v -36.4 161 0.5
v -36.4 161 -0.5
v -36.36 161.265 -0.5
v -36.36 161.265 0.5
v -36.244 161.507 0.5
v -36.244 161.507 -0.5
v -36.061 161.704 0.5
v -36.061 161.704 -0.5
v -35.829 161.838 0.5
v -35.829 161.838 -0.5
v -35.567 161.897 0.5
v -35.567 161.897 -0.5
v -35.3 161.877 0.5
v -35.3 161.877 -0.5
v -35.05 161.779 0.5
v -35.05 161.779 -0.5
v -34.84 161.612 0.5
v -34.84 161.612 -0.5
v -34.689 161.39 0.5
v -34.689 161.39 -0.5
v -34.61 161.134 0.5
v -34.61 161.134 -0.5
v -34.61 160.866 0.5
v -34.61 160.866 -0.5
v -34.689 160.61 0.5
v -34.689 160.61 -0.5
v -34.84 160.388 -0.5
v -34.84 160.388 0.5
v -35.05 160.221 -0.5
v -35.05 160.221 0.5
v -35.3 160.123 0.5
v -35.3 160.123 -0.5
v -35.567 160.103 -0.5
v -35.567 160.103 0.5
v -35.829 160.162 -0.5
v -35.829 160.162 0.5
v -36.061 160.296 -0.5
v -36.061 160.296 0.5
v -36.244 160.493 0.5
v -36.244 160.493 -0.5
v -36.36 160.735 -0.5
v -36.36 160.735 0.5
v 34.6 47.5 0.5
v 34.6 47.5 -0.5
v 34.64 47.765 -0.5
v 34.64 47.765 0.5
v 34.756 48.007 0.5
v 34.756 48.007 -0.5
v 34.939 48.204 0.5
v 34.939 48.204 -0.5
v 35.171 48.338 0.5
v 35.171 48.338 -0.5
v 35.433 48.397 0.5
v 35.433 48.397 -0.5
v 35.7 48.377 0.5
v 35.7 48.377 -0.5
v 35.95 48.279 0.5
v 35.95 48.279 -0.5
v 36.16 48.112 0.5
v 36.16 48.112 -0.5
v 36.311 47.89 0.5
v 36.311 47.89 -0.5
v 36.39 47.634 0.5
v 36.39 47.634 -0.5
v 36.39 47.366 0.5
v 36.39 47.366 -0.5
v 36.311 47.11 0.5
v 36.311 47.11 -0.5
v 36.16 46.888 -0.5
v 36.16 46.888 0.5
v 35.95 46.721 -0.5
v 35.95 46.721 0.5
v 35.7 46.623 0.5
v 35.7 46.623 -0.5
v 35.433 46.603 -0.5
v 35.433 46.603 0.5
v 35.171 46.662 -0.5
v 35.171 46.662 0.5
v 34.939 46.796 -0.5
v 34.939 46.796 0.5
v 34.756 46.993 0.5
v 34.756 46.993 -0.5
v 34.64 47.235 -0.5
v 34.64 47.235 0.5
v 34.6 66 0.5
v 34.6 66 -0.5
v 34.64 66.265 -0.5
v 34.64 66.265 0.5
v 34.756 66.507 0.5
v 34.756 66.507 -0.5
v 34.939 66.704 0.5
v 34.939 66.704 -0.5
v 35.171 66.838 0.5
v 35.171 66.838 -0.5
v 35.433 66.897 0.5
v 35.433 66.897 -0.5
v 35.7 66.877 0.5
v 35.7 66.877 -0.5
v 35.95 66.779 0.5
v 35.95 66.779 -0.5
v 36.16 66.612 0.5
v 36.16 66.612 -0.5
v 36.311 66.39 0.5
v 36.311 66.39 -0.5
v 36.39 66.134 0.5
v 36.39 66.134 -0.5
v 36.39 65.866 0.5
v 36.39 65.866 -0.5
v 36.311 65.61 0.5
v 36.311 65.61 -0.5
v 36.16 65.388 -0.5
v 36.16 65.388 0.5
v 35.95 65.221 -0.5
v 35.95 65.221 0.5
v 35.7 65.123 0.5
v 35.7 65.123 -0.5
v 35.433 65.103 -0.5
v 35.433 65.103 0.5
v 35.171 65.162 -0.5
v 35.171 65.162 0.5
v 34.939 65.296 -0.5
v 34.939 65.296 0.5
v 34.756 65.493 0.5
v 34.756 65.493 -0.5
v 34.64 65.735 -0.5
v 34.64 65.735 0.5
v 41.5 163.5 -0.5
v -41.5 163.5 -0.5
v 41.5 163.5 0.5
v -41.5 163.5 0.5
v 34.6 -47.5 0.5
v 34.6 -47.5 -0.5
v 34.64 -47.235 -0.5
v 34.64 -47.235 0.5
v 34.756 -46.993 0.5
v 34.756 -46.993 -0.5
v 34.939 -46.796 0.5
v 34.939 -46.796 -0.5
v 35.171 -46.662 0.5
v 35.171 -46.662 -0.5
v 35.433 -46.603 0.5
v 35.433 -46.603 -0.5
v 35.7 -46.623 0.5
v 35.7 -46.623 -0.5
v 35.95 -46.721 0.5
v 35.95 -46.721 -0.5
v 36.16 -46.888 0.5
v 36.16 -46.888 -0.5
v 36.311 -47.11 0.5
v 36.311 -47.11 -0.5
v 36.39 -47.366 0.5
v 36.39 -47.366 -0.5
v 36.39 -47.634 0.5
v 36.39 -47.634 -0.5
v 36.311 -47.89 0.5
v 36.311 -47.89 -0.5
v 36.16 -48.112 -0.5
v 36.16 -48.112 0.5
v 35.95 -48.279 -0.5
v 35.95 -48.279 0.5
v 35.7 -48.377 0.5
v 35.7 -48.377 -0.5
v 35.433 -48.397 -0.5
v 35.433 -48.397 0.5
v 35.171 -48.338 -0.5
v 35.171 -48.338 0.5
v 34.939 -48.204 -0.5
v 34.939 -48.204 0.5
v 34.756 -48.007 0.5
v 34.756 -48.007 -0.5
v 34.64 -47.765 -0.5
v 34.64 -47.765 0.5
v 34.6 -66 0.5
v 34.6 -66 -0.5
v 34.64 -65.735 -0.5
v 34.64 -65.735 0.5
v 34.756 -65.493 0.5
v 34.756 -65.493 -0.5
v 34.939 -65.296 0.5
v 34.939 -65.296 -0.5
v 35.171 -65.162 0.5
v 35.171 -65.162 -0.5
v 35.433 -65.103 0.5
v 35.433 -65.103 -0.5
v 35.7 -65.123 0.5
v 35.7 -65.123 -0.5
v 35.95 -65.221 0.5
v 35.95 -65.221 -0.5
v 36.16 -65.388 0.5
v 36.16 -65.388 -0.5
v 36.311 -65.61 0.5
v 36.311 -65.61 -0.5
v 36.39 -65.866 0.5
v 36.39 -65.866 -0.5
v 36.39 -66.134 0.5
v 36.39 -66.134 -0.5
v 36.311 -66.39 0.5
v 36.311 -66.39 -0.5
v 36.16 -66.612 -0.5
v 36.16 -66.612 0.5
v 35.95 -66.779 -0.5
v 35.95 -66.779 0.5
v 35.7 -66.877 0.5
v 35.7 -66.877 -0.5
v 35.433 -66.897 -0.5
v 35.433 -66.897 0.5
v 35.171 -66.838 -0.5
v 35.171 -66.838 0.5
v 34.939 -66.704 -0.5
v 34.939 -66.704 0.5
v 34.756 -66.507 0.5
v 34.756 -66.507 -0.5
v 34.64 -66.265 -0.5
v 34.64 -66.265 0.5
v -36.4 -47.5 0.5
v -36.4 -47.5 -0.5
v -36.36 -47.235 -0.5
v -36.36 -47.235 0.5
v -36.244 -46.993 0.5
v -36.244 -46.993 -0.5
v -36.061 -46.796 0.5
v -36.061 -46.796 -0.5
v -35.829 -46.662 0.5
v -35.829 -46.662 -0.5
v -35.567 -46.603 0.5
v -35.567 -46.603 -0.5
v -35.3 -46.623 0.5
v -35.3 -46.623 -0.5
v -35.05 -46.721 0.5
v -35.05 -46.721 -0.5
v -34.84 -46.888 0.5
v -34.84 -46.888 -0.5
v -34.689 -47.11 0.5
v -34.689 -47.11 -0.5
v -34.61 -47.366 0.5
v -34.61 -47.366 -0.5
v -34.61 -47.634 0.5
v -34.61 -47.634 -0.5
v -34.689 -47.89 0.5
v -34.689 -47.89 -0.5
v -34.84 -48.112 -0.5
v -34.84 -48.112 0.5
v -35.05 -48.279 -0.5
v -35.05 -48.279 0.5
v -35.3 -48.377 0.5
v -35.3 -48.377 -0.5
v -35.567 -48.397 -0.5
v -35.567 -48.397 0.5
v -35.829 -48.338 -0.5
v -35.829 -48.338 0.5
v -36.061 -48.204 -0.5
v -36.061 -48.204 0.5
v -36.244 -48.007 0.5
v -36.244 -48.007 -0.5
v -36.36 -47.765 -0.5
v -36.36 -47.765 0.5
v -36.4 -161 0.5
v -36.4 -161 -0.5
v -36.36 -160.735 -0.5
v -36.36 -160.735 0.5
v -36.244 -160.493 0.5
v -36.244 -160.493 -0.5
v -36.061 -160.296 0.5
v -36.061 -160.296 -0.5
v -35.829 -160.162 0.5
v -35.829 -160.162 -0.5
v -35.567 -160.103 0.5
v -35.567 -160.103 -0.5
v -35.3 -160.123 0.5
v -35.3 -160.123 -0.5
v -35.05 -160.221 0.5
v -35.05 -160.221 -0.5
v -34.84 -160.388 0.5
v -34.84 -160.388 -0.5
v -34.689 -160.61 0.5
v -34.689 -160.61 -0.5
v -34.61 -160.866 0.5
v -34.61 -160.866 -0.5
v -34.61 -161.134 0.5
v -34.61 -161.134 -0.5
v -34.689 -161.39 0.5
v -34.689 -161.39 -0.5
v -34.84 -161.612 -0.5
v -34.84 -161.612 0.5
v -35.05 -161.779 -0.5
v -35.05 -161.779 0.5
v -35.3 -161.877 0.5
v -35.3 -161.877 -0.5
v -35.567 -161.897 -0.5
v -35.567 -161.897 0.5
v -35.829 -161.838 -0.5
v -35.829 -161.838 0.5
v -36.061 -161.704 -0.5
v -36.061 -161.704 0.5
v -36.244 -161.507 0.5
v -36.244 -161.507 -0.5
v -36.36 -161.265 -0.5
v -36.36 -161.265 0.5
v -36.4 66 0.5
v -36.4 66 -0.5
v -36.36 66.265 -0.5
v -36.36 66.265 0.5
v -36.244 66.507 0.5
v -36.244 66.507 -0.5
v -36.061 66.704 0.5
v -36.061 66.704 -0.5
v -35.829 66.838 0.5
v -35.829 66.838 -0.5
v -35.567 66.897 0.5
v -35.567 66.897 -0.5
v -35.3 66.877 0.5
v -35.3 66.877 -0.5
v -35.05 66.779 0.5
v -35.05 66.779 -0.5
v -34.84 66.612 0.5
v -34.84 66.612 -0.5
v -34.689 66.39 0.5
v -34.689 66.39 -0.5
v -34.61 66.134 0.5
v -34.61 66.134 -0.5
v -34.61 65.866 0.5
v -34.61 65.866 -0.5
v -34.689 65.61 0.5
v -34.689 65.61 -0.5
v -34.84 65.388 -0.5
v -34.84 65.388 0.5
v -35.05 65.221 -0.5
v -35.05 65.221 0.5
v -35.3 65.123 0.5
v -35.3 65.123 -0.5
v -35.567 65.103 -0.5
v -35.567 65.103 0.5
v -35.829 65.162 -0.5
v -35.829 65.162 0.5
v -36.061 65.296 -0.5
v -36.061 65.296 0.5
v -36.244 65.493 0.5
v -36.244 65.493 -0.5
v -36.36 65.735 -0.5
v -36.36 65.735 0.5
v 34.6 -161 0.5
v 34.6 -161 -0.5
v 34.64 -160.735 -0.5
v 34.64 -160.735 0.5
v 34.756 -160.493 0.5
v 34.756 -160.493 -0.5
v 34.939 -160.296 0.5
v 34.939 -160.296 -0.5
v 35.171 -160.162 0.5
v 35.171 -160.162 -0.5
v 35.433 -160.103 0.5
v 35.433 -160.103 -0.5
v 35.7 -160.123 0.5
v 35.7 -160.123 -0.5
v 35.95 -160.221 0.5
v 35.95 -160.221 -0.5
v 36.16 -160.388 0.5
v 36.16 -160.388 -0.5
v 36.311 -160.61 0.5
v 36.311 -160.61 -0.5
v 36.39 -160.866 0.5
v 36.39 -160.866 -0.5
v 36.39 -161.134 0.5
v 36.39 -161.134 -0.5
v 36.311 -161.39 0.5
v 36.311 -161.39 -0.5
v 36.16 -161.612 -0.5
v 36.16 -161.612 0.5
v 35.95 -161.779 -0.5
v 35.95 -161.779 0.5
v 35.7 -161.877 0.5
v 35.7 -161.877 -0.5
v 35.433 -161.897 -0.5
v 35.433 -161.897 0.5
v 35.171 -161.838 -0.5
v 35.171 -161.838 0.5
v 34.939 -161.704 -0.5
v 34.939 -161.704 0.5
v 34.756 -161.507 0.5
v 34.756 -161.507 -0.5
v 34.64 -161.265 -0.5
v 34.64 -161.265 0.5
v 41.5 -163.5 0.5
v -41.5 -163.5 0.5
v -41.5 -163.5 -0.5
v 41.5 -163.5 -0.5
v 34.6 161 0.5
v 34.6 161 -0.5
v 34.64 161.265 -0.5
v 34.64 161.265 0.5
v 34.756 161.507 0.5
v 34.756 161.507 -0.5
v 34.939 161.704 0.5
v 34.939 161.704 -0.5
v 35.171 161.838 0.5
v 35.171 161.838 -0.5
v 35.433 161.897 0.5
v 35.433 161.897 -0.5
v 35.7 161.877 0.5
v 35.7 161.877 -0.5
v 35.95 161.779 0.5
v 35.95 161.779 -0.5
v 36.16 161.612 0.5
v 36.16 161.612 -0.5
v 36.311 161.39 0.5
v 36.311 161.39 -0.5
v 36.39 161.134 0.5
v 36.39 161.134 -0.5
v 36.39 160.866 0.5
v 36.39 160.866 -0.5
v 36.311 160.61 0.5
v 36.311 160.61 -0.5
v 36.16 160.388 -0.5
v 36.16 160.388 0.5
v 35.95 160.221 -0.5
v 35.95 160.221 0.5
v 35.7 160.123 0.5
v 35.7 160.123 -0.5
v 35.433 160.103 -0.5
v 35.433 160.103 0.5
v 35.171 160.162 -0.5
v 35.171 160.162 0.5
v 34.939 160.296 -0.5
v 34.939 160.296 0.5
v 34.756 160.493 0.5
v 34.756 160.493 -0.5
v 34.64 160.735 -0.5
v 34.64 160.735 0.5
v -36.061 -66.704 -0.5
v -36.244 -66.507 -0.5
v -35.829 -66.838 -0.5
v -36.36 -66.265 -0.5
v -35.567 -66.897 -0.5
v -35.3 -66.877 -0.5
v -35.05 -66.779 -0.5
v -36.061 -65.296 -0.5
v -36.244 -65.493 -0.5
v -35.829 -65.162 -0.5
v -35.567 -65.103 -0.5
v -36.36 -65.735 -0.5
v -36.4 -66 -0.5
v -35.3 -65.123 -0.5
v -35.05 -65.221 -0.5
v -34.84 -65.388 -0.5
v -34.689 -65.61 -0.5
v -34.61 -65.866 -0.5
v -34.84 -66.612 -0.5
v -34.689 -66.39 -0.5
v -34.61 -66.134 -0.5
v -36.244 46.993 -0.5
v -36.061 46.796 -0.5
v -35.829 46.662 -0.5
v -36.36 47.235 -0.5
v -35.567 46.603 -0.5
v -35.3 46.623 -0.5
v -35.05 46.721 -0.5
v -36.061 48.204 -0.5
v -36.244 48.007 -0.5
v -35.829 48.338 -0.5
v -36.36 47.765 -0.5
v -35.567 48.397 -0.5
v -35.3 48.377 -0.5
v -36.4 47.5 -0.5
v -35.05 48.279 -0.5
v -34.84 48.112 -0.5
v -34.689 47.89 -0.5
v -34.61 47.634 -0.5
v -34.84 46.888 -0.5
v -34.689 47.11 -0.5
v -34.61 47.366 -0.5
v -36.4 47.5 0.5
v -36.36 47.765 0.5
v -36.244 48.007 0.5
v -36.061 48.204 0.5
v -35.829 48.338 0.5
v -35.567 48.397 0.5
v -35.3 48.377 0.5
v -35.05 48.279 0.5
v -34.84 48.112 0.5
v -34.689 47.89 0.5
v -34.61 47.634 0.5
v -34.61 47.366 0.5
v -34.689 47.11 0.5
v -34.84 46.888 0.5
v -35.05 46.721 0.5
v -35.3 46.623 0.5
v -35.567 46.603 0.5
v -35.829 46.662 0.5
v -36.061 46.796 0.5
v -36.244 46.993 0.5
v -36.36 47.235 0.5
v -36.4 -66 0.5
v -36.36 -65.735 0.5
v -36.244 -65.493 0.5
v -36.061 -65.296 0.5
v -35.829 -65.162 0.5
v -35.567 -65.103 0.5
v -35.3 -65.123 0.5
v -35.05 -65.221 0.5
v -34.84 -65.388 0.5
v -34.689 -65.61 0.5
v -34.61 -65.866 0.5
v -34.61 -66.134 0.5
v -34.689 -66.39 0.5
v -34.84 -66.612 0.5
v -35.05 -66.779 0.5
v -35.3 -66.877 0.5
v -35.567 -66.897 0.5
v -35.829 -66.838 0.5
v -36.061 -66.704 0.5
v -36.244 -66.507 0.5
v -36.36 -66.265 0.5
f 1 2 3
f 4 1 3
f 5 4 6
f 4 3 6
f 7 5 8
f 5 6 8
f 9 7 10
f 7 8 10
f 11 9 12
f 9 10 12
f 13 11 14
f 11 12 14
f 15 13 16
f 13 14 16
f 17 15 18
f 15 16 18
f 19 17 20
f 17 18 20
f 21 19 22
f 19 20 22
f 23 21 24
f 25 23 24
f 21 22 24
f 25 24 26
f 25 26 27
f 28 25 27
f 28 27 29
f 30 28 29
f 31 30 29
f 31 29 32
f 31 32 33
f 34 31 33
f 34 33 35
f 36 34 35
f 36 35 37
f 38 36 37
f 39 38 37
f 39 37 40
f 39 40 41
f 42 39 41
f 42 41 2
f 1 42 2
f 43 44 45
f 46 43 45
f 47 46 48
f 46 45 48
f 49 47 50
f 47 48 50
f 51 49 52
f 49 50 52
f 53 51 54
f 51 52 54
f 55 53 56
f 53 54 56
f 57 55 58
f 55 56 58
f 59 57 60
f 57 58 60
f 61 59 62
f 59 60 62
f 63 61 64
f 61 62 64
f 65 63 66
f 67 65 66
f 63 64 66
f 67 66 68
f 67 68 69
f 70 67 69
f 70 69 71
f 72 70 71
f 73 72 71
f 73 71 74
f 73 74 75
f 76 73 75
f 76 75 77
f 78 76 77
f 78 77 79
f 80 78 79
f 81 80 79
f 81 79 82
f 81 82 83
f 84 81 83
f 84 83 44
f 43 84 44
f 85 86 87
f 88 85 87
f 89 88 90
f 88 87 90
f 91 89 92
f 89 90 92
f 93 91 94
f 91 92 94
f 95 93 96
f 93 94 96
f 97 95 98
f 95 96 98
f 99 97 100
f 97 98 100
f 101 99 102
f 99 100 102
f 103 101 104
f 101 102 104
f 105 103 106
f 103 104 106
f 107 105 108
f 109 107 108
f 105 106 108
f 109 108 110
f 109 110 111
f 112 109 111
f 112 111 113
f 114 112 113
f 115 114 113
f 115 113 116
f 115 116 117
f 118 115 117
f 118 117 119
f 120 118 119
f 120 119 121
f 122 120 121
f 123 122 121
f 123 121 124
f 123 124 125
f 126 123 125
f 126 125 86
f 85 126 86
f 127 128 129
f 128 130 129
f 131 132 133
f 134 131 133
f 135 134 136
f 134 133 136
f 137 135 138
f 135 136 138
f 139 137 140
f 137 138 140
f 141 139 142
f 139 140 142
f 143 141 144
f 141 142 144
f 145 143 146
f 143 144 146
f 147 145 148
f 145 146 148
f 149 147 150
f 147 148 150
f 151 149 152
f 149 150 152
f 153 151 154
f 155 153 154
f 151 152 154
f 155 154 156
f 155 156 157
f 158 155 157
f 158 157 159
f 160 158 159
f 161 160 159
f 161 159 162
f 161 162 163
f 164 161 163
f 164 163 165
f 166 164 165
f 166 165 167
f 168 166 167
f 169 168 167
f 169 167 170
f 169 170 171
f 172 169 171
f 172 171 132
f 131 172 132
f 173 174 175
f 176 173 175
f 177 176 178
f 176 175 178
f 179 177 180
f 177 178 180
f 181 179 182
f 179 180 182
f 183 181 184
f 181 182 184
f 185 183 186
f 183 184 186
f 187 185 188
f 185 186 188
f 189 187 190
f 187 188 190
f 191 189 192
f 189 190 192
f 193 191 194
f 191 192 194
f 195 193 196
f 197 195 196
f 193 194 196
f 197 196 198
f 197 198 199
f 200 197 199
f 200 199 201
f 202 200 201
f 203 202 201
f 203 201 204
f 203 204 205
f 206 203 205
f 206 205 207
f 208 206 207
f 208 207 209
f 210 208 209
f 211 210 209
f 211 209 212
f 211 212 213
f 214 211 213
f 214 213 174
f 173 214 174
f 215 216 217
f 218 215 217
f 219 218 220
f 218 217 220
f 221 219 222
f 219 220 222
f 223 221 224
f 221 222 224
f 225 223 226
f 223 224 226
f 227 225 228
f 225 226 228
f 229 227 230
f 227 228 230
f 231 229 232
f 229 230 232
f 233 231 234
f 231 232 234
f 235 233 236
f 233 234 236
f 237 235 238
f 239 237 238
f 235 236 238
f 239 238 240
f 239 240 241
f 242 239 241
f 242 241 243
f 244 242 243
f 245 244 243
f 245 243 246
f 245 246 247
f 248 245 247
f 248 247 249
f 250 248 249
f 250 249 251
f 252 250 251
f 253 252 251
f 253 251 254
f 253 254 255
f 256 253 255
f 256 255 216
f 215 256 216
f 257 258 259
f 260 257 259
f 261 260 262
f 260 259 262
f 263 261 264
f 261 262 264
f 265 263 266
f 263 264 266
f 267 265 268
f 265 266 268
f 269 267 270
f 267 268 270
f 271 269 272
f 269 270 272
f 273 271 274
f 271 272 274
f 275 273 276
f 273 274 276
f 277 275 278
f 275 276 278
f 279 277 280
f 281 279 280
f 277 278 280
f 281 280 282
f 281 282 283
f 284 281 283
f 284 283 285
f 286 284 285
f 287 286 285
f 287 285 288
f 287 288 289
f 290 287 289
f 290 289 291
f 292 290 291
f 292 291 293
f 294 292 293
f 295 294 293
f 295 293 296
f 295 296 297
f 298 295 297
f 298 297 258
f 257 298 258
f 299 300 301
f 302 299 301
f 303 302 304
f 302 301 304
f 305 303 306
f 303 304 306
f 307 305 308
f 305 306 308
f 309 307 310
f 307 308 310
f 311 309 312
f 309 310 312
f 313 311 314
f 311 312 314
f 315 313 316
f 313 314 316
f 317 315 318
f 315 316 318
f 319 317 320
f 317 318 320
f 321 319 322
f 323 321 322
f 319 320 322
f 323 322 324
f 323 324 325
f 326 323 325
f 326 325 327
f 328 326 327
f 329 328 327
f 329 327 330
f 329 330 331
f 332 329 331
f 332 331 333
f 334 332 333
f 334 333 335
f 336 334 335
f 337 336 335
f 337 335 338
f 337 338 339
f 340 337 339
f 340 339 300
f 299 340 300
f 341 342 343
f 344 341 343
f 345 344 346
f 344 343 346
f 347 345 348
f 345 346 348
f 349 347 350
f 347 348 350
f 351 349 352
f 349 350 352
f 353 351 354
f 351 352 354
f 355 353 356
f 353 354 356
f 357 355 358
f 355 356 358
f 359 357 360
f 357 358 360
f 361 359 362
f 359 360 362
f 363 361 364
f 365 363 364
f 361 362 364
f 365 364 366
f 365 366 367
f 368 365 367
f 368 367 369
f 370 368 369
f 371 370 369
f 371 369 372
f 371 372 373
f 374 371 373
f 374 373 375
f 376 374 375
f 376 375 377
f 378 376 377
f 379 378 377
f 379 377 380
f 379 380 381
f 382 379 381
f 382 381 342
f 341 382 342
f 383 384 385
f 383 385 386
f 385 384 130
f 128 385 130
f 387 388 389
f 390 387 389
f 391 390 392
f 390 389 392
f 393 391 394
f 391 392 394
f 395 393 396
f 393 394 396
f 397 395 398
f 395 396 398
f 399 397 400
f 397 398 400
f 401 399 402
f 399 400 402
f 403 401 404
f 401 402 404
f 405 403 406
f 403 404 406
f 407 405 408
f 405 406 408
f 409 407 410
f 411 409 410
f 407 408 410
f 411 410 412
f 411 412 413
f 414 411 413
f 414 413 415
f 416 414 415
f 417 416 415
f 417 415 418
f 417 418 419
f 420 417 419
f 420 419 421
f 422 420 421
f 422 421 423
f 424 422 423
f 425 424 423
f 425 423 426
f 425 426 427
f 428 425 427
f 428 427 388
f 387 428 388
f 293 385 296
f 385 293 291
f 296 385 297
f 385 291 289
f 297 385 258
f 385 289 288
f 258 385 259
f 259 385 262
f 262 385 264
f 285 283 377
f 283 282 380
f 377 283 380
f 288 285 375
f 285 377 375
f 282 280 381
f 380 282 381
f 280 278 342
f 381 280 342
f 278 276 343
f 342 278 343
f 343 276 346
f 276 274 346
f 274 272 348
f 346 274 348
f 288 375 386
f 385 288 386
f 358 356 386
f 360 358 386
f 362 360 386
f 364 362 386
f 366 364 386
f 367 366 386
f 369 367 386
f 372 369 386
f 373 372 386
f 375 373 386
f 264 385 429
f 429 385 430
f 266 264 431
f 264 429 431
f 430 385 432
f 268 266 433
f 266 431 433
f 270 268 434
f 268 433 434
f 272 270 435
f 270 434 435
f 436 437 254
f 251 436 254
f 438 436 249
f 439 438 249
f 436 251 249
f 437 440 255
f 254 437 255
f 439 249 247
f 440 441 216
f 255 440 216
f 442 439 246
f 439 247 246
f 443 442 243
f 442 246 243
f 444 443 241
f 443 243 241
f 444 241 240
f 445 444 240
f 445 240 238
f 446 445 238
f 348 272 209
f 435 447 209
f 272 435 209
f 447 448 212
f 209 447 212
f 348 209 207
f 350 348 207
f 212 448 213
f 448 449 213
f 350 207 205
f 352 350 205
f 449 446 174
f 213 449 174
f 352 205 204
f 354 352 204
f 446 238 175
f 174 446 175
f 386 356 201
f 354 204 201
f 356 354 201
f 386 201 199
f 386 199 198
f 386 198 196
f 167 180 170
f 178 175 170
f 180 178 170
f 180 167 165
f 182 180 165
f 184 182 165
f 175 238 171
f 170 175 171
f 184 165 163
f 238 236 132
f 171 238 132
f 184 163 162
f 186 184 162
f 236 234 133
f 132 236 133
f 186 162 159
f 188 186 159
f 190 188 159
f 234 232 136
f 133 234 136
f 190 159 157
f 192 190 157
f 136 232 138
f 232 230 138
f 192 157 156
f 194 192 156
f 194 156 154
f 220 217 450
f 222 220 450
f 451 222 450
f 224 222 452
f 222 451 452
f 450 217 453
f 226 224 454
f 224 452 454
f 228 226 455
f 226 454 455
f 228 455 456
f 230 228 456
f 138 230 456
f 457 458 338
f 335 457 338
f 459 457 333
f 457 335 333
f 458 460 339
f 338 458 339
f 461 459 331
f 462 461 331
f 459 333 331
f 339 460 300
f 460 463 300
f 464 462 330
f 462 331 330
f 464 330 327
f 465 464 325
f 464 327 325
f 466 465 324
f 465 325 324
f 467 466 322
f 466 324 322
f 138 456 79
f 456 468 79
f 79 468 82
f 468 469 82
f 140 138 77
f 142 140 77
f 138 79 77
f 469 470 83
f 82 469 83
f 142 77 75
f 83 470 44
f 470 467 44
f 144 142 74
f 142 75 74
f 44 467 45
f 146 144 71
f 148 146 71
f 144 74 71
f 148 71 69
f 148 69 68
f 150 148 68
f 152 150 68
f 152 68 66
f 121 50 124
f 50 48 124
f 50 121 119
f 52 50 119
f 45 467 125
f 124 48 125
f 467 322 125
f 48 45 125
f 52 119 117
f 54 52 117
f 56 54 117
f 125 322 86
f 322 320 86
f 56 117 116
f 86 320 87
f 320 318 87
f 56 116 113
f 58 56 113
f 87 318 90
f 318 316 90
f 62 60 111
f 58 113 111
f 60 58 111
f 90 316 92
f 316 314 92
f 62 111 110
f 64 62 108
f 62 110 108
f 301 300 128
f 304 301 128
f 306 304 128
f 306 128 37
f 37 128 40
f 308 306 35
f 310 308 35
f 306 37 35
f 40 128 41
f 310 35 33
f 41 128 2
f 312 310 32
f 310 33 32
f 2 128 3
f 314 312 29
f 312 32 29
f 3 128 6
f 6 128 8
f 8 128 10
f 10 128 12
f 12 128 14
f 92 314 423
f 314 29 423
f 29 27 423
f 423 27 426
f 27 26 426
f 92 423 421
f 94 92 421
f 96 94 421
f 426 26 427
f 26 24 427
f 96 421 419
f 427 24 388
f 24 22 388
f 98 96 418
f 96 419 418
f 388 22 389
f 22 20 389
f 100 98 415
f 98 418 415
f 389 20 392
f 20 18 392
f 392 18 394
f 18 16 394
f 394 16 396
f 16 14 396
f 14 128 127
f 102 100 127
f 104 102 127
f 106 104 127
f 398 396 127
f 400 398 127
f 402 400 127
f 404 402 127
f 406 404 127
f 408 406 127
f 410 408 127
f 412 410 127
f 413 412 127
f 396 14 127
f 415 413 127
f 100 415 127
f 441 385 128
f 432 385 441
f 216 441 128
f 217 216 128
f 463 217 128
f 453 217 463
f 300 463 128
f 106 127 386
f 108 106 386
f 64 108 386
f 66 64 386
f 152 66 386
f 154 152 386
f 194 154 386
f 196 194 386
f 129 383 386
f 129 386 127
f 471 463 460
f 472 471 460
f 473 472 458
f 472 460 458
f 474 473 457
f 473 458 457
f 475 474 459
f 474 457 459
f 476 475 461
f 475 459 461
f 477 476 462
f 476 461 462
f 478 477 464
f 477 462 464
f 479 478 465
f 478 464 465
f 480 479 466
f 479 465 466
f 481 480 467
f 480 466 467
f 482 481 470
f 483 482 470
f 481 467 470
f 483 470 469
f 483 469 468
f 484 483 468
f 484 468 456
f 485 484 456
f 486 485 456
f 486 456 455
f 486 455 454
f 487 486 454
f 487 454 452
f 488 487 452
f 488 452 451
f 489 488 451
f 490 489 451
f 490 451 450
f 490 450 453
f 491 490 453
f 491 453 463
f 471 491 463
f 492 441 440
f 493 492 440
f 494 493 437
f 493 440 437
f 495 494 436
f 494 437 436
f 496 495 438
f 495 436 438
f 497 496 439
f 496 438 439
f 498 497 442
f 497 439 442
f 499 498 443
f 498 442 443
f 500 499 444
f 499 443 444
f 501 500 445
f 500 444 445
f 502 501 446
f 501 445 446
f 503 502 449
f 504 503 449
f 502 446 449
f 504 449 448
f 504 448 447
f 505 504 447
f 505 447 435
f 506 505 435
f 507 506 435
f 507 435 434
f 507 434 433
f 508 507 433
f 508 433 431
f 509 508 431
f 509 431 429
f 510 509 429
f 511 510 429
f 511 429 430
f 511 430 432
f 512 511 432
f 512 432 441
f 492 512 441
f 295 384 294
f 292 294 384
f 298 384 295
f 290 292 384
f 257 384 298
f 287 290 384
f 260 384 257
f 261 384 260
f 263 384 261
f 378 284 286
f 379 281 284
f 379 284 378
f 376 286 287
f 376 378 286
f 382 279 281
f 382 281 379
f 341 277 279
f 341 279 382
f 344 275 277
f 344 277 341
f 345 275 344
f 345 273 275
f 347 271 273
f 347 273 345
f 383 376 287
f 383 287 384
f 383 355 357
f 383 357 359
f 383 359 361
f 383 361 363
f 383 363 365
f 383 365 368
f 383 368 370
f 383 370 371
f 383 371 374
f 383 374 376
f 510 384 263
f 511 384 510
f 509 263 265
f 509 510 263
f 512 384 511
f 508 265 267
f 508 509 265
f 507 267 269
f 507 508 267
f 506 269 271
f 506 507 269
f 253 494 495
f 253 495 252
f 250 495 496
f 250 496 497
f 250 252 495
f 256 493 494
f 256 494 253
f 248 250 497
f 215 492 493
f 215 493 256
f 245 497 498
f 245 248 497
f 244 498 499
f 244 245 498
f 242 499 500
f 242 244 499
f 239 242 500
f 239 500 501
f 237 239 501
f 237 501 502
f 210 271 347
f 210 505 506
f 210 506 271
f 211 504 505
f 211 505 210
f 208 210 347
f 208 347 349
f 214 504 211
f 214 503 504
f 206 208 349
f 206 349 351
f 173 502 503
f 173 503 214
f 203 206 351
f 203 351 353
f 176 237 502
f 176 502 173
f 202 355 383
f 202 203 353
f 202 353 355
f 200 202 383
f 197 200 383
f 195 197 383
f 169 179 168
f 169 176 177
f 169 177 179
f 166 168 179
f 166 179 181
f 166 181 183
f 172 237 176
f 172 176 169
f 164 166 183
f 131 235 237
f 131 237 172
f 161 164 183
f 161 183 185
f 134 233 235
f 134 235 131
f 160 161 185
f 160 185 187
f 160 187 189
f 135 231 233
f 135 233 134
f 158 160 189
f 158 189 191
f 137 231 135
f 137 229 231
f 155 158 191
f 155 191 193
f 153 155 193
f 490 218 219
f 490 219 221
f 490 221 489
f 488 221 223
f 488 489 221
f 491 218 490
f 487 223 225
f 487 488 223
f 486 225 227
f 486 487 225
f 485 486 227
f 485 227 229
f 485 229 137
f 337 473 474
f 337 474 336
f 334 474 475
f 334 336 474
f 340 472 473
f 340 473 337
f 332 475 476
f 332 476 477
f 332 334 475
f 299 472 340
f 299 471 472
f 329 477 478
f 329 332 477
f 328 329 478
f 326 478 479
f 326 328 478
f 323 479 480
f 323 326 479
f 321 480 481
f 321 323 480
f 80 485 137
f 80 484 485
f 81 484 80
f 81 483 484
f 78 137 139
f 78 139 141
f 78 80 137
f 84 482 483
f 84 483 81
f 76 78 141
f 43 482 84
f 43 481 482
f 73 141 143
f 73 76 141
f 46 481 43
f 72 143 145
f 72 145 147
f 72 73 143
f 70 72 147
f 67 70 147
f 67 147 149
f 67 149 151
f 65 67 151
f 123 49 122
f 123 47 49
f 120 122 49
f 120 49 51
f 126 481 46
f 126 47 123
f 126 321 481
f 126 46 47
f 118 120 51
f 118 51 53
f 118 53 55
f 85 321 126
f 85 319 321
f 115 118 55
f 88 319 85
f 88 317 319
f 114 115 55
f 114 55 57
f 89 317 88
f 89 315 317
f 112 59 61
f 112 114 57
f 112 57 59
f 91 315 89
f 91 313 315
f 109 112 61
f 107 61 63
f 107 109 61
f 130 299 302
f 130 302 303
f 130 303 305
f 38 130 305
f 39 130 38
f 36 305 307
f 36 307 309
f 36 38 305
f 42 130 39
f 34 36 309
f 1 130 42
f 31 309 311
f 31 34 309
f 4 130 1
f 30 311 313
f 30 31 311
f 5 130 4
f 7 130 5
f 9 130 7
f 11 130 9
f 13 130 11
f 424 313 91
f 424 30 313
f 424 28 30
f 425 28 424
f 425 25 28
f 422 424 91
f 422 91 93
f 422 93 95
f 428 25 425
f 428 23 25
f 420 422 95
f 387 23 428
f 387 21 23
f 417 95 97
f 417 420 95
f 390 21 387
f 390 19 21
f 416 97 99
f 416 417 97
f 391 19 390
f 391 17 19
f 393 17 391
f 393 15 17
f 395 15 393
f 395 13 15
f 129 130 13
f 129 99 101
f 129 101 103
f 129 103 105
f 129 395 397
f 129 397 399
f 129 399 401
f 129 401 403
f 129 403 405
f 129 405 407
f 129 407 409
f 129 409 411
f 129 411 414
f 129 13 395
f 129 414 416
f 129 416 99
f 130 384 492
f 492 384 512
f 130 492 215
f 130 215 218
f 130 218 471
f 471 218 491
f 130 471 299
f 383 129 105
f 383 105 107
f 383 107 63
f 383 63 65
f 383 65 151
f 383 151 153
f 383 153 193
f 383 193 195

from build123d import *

# Parameters (mm, degrees)
SKETCH1_W              = 83
SKETCH1_H              = 327
BOSS_EXTRUDE1_DEPTH    = 0.5
M1_6_CLEARANCE_HOLE1_D = 1.8


with BuildPart() as part:
    # Sketch1 → Boss-Extrude1 (new, symmetric)
    with BuildSketch(Plane.XY):
        Rectangle(SKETCH1_W, SKETCH1_H)
    extrude(amount=BOSS_EXTRUDE1_DEPTH, both=True)

    # M1.6 Clearance Hole1 (through all)
    with Locations(Plane.XY.offset(0.5)):
        with Locations((-35.5, 161), (35.5, 161), (-35.5, 66), (35.5, 66), (-35.5, 47.5), (35.5, 47.5), (-35.5, -47.5), (35.5, -47.5), (-35.5, -66), (35.5, -66), (-35.5, -161), (35.5, -161)):
            Hole(M1_6_CLEARANCE_HOLE1_D / 2)


solid = part.part
